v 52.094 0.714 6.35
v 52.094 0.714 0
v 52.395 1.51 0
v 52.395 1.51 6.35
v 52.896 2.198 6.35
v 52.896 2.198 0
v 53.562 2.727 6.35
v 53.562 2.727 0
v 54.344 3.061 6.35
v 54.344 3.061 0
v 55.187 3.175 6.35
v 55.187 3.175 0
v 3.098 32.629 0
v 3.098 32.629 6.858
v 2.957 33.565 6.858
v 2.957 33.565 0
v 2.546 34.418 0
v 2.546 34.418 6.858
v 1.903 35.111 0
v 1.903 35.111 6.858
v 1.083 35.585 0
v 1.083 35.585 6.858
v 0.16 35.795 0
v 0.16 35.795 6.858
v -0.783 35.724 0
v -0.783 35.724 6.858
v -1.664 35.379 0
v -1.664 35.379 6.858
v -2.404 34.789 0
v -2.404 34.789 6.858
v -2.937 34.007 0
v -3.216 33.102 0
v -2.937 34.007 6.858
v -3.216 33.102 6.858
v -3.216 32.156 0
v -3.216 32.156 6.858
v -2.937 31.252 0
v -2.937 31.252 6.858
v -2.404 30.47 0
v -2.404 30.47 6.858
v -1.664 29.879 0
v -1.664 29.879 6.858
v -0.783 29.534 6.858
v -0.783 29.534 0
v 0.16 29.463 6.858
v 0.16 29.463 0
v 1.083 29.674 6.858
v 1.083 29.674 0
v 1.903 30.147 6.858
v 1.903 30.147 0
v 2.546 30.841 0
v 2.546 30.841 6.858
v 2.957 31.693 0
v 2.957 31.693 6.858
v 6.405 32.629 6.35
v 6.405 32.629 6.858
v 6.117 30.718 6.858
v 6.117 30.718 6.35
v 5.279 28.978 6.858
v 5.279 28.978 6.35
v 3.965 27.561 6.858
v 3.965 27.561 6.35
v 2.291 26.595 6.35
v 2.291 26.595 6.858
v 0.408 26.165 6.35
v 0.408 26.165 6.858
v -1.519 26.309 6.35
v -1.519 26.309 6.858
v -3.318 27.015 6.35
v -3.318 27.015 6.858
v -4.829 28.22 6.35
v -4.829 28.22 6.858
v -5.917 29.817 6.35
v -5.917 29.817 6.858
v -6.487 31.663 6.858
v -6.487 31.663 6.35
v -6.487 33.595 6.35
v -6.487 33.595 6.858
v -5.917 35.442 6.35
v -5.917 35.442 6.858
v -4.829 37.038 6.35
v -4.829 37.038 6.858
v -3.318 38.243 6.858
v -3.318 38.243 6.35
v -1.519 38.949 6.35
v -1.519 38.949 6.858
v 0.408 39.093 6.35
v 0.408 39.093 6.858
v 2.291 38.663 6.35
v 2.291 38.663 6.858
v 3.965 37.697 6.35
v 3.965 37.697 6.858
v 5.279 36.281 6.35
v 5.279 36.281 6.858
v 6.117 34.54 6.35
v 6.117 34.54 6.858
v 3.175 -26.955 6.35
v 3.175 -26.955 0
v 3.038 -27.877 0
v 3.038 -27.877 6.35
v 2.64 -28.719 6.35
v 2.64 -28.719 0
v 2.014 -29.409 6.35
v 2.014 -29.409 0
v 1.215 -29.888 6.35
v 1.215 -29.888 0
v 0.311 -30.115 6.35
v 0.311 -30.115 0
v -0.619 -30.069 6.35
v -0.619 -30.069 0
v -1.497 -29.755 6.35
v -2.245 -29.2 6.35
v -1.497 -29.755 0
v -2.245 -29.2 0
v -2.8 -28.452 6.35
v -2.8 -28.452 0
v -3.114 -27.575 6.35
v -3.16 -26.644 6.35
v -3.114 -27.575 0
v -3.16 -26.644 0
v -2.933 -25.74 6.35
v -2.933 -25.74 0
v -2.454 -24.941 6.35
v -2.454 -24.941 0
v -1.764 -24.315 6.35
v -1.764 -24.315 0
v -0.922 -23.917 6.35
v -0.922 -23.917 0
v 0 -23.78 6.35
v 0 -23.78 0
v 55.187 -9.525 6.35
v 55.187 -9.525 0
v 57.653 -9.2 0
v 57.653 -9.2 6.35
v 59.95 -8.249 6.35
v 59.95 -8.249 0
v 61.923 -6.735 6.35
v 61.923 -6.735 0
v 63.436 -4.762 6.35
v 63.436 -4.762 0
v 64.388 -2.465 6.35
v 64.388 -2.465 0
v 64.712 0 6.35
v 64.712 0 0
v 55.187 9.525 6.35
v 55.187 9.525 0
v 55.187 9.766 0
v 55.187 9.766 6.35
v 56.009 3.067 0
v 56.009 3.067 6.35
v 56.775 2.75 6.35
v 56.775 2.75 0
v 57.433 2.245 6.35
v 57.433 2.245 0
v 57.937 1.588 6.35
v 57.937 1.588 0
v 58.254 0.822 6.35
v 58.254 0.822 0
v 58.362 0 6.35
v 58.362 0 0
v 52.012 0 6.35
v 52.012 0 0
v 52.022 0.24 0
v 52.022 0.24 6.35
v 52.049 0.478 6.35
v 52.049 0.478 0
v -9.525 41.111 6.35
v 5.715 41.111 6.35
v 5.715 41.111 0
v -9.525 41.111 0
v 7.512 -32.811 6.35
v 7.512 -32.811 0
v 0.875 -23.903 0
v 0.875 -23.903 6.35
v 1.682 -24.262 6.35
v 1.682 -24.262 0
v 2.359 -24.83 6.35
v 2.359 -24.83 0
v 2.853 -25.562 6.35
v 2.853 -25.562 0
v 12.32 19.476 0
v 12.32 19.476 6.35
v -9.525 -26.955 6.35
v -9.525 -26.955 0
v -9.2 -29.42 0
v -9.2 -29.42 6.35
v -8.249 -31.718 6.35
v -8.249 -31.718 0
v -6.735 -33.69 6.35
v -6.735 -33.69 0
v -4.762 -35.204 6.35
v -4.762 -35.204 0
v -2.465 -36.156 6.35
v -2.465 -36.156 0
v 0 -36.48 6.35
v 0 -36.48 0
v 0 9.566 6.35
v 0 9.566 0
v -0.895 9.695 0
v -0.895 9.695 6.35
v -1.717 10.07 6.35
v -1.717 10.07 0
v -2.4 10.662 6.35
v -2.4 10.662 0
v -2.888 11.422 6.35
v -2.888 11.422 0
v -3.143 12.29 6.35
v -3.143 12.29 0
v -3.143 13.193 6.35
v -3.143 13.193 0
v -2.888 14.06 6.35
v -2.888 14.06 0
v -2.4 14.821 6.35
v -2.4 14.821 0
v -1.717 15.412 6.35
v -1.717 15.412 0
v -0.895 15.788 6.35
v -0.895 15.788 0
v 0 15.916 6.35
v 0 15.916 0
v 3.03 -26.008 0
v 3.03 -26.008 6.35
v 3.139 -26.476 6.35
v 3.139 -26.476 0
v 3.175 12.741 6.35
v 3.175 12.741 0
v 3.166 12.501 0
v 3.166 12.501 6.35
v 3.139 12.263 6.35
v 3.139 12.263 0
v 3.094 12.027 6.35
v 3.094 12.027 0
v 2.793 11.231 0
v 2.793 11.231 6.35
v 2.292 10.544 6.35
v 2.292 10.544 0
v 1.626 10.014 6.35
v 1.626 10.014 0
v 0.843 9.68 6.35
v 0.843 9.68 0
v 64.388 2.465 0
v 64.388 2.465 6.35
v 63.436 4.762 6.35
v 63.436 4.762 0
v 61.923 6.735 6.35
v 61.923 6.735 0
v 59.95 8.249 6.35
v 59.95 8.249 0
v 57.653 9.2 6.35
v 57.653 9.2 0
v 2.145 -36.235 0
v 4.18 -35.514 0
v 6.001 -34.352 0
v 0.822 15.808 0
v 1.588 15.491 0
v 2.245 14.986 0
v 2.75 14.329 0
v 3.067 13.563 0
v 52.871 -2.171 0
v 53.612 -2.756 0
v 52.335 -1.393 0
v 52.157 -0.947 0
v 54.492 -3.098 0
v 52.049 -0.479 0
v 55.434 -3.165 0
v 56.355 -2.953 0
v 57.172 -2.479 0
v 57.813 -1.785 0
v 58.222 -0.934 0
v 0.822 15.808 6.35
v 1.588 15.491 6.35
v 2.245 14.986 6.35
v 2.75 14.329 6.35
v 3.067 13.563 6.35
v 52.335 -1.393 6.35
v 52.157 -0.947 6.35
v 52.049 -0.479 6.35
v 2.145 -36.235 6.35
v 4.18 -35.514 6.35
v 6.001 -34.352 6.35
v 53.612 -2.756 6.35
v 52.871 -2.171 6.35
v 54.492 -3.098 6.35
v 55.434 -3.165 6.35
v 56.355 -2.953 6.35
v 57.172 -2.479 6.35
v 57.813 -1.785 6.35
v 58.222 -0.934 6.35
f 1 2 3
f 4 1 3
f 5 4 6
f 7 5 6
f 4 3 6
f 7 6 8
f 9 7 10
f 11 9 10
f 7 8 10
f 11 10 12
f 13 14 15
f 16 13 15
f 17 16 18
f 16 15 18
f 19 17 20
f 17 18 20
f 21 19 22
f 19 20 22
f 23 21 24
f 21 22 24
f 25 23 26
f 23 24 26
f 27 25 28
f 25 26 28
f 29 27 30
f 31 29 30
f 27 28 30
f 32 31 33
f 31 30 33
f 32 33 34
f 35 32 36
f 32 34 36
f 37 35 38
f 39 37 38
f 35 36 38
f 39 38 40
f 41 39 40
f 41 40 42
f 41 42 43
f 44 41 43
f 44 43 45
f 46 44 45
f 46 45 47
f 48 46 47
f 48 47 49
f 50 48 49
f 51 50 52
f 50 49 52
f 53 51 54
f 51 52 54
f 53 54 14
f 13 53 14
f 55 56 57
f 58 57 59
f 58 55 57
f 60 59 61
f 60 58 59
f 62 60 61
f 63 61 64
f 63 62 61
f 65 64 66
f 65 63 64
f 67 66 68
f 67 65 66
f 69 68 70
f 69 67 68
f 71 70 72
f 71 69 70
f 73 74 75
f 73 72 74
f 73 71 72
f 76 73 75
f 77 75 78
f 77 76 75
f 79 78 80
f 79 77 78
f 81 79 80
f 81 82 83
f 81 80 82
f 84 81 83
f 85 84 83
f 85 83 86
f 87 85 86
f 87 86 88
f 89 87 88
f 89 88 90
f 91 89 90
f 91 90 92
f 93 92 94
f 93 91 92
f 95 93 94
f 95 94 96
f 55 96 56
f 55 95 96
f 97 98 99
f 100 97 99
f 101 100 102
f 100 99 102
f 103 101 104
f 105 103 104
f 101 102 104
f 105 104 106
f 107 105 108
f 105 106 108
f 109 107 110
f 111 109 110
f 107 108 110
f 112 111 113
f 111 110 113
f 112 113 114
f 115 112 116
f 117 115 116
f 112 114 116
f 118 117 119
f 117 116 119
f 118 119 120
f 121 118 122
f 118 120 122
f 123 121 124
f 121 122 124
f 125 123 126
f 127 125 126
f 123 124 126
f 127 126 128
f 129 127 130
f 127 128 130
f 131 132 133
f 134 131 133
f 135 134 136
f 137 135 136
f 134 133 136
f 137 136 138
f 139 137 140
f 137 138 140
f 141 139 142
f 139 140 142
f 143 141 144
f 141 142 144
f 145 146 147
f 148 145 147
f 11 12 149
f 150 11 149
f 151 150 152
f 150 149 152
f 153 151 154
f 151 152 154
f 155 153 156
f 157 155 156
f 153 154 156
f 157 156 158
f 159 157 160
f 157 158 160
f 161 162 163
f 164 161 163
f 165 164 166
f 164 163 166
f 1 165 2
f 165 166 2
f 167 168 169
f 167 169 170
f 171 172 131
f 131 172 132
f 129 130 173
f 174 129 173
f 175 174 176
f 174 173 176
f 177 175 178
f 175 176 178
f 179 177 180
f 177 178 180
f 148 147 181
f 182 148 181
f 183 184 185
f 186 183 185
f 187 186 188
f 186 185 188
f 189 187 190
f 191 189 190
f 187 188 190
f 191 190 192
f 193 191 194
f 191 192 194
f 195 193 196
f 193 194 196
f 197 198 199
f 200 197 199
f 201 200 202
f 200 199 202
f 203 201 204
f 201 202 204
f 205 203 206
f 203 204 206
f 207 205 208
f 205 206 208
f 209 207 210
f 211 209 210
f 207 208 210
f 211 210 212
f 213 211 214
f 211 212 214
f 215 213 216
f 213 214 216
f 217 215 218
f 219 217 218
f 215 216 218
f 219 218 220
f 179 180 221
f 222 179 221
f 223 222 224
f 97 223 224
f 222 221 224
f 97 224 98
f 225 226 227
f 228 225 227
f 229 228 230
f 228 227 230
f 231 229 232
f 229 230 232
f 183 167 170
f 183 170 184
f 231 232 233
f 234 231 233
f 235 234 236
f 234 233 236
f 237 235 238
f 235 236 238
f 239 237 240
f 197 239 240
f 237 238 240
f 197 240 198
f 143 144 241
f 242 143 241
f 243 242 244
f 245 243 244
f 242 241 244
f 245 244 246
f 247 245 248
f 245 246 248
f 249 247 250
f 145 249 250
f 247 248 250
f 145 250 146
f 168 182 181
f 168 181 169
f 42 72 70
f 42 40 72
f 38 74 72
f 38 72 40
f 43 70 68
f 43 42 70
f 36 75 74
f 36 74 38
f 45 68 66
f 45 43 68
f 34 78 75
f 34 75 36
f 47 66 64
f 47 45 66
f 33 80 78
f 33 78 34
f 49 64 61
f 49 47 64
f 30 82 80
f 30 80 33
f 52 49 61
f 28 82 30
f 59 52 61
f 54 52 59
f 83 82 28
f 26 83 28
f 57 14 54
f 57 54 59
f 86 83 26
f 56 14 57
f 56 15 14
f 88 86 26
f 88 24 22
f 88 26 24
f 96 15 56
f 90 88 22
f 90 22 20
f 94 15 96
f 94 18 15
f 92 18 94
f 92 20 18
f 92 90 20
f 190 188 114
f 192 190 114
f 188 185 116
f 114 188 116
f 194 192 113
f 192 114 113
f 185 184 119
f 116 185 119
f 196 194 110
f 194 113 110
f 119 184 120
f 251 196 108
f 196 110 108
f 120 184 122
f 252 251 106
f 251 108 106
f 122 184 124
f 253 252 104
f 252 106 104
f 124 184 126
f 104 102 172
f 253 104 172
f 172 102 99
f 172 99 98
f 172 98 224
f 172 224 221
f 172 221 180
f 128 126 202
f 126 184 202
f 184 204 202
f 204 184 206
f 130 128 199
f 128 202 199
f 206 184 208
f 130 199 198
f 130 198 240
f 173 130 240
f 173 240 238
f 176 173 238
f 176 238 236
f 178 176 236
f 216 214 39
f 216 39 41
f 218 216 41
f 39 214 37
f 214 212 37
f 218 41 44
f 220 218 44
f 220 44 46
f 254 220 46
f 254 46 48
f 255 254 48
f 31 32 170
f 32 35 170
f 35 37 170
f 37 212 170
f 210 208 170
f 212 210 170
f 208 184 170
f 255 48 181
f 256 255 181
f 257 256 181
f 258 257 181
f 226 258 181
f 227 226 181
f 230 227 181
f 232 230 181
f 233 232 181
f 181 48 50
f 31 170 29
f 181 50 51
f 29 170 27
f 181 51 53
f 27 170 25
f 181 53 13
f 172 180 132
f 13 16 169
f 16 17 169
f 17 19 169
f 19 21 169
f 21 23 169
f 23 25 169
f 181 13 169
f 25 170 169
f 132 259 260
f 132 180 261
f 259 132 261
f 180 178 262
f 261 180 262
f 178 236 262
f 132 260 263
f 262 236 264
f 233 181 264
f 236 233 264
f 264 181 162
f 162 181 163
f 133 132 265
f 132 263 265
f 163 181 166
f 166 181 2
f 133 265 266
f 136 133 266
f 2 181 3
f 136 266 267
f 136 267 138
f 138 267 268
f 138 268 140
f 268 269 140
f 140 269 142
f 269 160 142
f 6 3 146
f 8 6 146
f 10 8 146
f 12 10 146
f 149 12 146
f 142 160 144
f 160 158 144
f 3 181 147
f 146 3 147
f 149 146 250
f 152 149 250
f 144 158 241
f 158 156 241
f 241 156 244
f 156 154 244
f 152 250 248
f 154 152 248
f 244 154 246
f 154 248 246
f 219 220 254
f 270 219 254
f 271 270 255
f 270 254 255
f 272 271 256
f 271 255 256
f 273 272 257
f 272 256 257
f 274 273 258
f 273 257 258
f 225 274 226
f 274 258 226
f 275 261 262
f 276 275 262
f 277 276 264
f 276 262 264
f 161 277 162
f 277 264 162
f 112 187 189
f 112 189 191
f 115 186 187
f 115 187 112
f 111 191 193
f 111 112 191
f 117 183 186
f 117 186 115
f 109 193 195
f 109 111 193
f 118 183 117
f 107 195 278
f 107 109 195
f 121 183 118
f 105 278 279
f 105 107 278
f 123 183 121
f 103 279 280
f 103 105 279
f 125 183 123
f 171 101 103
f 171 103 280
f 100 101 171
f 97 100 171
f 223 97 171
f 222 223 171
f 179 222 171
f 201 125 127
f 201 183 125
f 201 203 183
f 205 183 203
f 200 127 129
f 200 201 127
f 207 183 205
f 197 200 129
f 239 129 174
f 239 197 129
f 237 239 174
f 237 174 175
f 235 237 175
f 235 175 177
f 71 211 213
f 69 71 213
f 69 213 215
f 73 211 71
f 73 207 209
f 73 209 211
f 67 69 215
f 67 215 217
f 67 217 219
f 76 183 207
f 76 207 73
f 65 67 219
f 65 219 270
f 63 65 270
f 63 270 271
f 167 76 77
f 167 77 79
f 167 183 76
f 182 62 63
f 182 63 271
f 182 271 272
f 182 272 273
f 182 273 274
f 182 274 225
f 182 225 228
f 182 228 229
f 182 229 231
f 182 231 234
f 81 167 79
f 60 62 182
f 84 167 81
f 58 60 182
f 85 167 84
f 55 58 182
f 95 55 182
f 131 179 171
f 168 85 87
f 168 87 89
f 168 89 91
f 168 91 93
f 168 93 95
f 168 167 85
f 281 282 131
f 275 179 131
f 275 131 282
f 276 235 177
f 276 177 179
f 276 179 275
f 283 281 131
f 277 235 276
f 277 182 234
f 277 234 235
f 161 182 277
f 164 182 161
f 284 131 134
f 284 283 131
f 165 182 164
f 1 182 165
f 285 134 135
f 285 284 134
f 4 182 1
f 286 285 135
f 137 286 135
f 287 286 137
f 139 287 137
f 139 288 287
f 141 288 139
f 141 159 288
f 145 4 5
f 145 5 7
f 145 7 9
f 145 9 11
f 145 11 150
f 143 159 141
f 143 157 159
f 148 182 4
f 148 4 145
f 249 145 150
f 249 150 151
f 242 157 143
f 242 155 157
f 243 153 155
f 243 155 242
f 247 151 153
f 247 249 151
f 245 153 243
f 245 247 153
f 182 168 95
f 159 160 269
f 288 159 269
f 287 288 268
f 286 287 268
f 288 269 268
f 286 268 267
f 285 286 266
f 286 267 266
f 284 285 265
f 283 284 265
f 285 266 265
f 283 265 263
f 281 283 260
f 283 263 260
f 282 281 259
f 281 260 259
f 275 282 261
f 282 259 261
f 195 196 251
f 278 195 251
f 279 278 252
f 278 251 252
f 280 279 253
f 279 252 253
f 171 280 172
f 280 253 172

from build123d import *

# Parameters (mm, degrees)
F1_DEPTH = 6.35
F2_R     = 3.175
F3_DEPTH = 12.7
F4_R     = 6.4822420389
F5_DEPTH = 6.35
F6_DEPTH = 19.558
F7_DEPTH = 6.35
F8_R     = 6.4822420389
F8_R_2   = 3.175
F9_DEPTH = 6.35


with BuildPart() as f1:
    # F0 (on Top) → F1 (new body)
    with BuildSketch(Plane.XY):
        with BuildLine():
            Line((0, -17.430102046), (0, 0))
            Line((0, 0), (0, 3.216402))
            ThreePointArc((0, 3.216402), (-6.7351920908, 6.0062099092), (-9.525, 12.741402))
            Line((-9.525, 12.741402), (-9.525, -26.955102046))
            ThreePointArc((-9.525, -26.955102046), (-6.7351920908, -20.2199099552), (0, -17.430102046))
        make_face()
        with BuildLine():
            ThreePointArc((-9.525, 12.741402), (-6.7351920908, 6.0062099092), (0, 3.216402))
            Line((0, 3.216402), (0, 9.566402))
            ThreePointArc((0, 9.566402), (-3.175, 12.741402), (0, 15.916402))
            Line((0, 15.916402), (0, 22.266402))
            ThreePointArc((0, 22.266402), (-6.7351920908, 19.4765940908), (-9.525, 12.741402))
        make_face()
        with BuildLine():
            Line((0, -23.780102046), (0, -17.430102046))
            ThreePointArc((0, -17.430102046), (-6.7351920908, -20.2199099552), (-9.525, -26.955102046))
            ThreePointArc((-9.525, -26.955102046), (-6.7351920908, -33.6902941368), (0, -36.480102046))
            Line((0, -36.480102046), (7.5123847033, -32.8108429103))
            ThreePointArc((7.5123847033, -32.8108429103), (9.007804652, -30.0510801387), (9.525, -26.955102046))
            ThreePointArc((9.525, -26.955102046), (9.2802728088, -24.809837122), (8.5586668568, -22.7748093967))
            Line((8.5586668568, -22.7748093967), (2.8528889523, -25.5616711629))
            ThreePointArc((2.8528889523, -25.5616711629), (3.0934242696, -26.240013738), (3.175, -26.955102046))
            ThreePointArc((3.175, -26.955102046), (-2.2450640303, -29.2001660763), (0, -23.780102046))
        make_face()
        with BuildLine():
            ThreePointArc((9.525, 12.741402), (9.463768469, 11.6631110537), (9.2808611307, 10.5986837096))
            Line((9.2808611307, 10.5986837096), (45.9066000969, 2.1427182904))
            ThreePointArc((45.9066000969, 2.1427182904), (49.2580332078, 7.4543617002), (55.1874612276, 9.525))
            Line((55.1874612276, 9.525), (55.1874612276, 9.7662775009))
            Line((55.1874612276, 9.7662775009), (4.1043156247, 21.3367622748))
            ThreePointArc((4.1043156247, 21.3367622748), (8.0566503997, 17.8223477129), (9.525, 12.741402))
        make_face()
        with BuildLine():
            Line((3.0936203769, 12.0271625699), (9.2808611307, 10.5986837096))
            ThreePointArc((9.2808611307, 10.5986837096), (9.463768469, 11.6631110537), (9.525, 12.741402))
            ThreePointArc((9.525, 12.741402), (8.0566503997, 17.8223477129), (4.1043156247, 21.3367622748))
            Line((4.1043156247, 21.3367622748), (0, 22.266402))
            Line((0, 22.266402), (0, 15.916402))
            ThreePointArc((0, 15.916402), (2.2450640303, 14.9864660303), (3.175, 12.741402))
            ThreePointArc((3.175, 12.741402), (3.1545894897, 12.3819716846), (3.0936203769, 12.0271625699))
        make_face()
        with BuildLine():
            ThreePointArc((55.1874612276, 9.525), (49.2580332078, 7.4543617002), (45.9066000969, 2.1427182904))
            Line((45.9066000969, 2.1427182904), (52.0938408507, 0.7142394301))
            ThreePointArc((52.0938408507, 0.7142394301), (53.210985221, 2.4847872334), (55.1874612276, 3.175))
            Line((55.1874612276, 3.175), (55.1874612276, 9.525))
        make_face()
        with BuildLine():
            ThreePointArc((55.1874612276, -9.525), (50.1422487685, -8.0790752096), (46.6287943708, -4.1802926493))
            Line((46.6287943708, -4.1802926493), (8.5586668568, -22.7748093967))
            ThreePointArc((8.5586668568, -22.7748093967), (9.2802728088, -24.809837122), (9.525, -26.955102046))
            ThreePointArc((9.525, -26.955102046), (9.007804652, -30.0510801387), (7.5123847033, -32.8108429103))
            Line((7.5123847033, -32.8108429103), (55.1874612276, -9.525))
        make_face()
        with BuildLine():
            Line((52.3345722753, -1.3934308831), (46.6287943708, -4.1802926493))
            ThreePointArc((46.6287943708, -4.1802926493), (50.1422487685, -8.0790752096), (55.1874612276, -9.525))
            ThreePointArc((55.1874612276, -9.525), (61.9226533184, -6.7351920908), (64.7124612276, 0))
            ThreePointArc((64.7124612276, 0), (61.9226533184, 6.7351920908), (55.1874612276, 9.525))
            Line((55.1874612276, 9.525), (55.1874612276, 3.175))
            ThreePointArc((55.1874612276, 3.175), (57.4325252579, 2.2450640303), (58.3624612276, 0))
            ThreePointArc((58.3624612276, 0), (55.9025495356, -3.0934242696), (52.3345722753, -1.3934308831))
        make_face()
        with BuildLine():
            ThreePointArc((4.1043156247, 21.3367622748), (2.1041409628, 22.0310852997), (0, 22.266402))
            Line((0, 22.266402), (4.1043156247, 21.3367622748))
        make_face()
        with BuildLine():
            Line((7.5123847033, -32.8108429103), (0, -36.480102046))
            ThreePointArc((0, -36.480102046), (4.1802926493, -35.5137689028), (7.5123847033, -32.8108429103))
        make_face()
        with BuildLine():
            Line((0, 3.216402), (0, 0))
            Line((0, 0), (45.6624612276, 0))
            ThreePointArc((45.6624612276, 0), (45.7236927586, 1.0782909463), (45.9066000969, 2.1427182904))
            Line((45.9066000969, 2.1427182904), (9.2808611307, 10.5986837096))
            ThreePointArc((9.2808611307, 10.5986837096), (5.9294280198, 5.2870402998), (0, 3.216402))
        make_face()
        with BuildLine():
            Line((0, 9.566402), (0, 3.216402))
            ThreePointArc((0, 3.216402), (5.9294280198, 5.2870402998), (9.2808611307, 10.5986837096))
            Line((9.2808611307, 10.5986837096), (3.0936203769, 12.0271625699))
            ThreePointArc((3.0936203769, 12.0271625699), (1.9764760066, 10.2566147666), (0, 9.566402))
        make_face()
        with BuildLine():
            Line((45.6624612276, 0), (0, 0))
            Line((0, 0), (0, -17.430102046))
            ThreePointArc((0, -17.430102046), (5.0452124591, -18.8760268364), (8.5586668568, -22.7748093967))
            Line((8.5586668568, -22.7748093967), (46.6287943708, -4.1802926493))
            ThreePointArc((46.6287943708, -4.1802926493), (45.9071884188, -2.145264924), (45.6624612276, 0))
        make_face()
        with BuildLine():
            ThreePointArc((8.5586668568, -22.7748093967), (5.0452124591, -18.8760268364), (0, -17.430102046))
            Line((0, -17.430102046), (0, -23.780102046))
            ThreePointArc((0, -23.780102046), (1.6817374864, -24.2620769761), (2.8528889523, -25.5616711629))
            Line((2.8528889523, -25.5616711629), (8.5586668568, -22.7748093967))
        make_face()
        with BuildLine():
            Line((52.0124612276, 0), (45.6624612276, 0))
            ThreePointArc((45.6624612276, 0), (45.9071884188, -2.145264924), (46.6287943708, -4.1802926493))
            Line((46.6287943708, -4.1802926493), (52.3345722753, -1.3934308831))
            ThreePointArc((52.3345722753, -1.3934308831), (52.094036958, -0.715088308), (52.0124612276, 0))
        make_face()
        with BuildLine():
            ThreePointArc((45.9066000969, 2.1427182904), (45.7236927586, 1.0782909463), (45.6624612276, 0))
            Line((45.6624612276, 0), (52.0124612276, 0))
            ThreePointArc((52.0124612276, 0), (52.0328717379, 0.3594303154), (52.0938408507, 0.7142394301))
            Line((52.0938408507, 0.7142394301), (45.9066000969, 2.1427182904))
        make_face()
    extrude(amount=F1_DEPTH)

    # F2 (on face) → F3 (join)
    with BuildSketch(Plane.XY.offset(6.35)):
        with BuildLine():
            Line((-9.525, 41.1111302674), (-9.525, 12.741402))
            ThreePointArc((-9.525, 12.741402), (-5.0809457129, 20.7980523997), (4.1043156247, 21.3367622748))
            Line((4.1043156247, 21.3367622748), (12.3195811982, 19.4759801301))
            Line((12.3195811982, 19.4759801301), (5.7150009088, 41.1111302674))
            Line((5.7150009088, 41.1111302674), (-9.525, 41.1111302674))
        make_face()
        with Locations((-0.0769013266, 32.6290909023)):
            Circle(F2_R, mode=Mode.SUBTRACT)
    extrude(amount=-F3_DEPTH)

    # F4 (on face) → F5 (cut)
    with BuildSketch(Plane(origin=(0, 0, -6.35), x_dir=(1, 0, 0), z_dir=(0, 0, -1))):
        with BuildLine():
            Line((-9.525, -41.1111302674), (5.7150009088, -41.1111302674))
            Line((5.7150009088, -41.1111302674), (12.3195811982, -19.4759801301))
            Line((12.3195811982, -19.4759801301), (4.1043156247, -21.3367622748))
            ThreePointArc((4.1043156247, -21.3367622748), (-5.0809457129, -20.7980523997), (-9.525, -12.741402))
            Line((-9.525, -12.741402), (-9.525, -41.1111302674))
        make_face()
        with Locations((-0.0769013266, -32.6290909023)):
            Circle(F4_R, mode=Mode.SUBTRACT)
    extrude(amount=-F5_DEPTH, mode=Mode.SUBTRACT)

    # F6 (add): a face of the model
    f6_faces = [f1.faces().sort_by_distance(p)[0] for p in [
        (-6.3757978733, 32.6290909023, -6.35),
    ]]
    extrude(f6_faces, amount=-F6_DEPTH)

    # F7 (cut): a face of the model
    f7_faces = [f1.faces().sort_by_distance(p)[0] for p in [
        (-6.3757978733, 32.6290909023, -6.35),
    ]]
    extrude(f7_faces, amount=-F7_DEPTH, mode=Mode.SUBTRACT)

    # F8 (on face) → F9 (cut)
    with BuildSketch(Plane.XY.offset(13.208)):
        with Locations((-0.0769013266, 32.6290909023)):
            Circle(F8_R)
        with Locations((-0.0769013266, 32.6290909023)):
            Circle(F8_R_2, mode=Mode.SUBTRACT)
    extrude(amount=-F9_DEPTH, mode=Mode.SUBTRACT)


solid = f1.part
